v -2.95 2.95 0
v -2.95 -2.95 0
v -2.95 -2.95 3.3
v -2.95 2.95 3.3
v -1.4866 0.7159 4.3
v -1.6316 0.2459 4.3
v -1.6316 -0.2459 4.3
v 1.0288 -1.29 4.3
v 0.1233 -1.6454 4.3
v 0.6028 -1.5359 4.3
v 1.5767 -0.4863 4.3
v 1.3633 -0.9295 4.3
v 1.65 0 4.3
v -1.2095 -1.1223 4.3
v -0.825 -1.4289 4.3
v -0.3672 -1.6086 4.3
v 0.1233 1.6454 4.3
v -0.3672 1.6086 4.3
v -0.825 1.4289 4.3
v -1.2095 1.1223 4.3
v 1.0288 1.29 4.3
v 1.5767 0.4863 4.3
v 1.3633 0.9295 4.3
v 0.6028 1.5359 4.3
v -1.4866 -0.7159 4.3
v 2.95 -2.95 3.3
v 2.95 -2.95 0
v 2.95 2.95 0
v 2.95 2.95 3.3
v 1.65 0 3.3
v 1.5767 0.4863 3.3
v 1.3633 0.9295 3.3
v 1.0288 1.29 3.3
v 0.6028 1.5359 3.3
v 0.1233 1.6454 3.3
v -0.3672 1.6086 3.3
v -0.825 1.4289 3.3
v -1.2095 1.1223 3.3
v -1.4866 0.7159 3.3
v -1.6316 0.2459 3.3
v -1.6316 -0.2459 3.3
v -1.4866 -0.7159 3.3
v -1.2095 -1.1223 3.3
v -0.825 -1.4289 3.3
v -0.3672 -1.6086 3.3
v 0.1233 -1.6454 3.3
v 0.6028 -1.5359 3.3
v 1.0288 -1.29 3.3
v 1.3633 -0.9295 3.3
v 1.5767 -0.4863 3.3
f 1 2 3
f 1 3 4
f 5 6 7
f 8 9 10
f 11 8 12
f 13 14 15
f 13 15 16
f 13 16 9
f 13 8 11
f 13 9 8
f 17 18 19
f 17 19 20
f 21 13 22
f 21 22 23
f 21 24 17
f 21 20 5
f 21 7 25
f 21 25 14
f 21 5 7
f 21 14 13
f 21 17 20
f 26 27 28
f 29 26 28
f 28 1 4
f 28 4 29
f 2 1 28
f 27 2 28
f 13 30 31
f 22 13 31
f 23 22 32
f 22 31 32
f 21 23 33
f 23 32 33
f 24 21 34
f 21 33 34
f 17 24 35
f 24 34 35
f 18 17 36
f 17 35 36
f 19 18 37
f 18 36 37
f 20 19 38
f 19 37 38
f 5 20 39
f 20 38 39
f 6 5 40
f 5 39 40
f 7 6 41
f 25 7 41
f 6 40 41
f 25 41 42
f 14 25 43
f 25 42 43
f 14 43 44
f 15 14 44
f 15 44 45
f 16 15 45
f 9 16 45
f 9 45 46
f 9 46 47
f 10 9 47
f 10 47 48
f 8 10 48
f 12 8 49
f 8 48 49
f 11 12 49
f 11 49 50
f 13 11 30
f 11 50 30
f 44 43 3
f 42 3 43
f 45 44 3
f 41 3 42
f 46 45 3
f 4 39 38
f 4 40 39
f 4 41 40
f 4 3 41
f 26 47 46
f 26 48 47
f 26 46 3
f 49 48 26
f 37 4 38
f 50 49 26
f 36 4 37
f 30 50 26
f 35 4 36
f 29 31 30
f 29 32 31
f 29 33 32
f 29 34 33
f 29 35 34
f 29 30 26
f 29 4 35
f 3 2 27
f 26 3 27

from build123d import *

# Parameters (mm, degrees)
ESBO_O1_W                = 5.9
ESBO_O1_H                = 5.9
RESSALTO_EXTRUS_O1_DEPTH = 3.3
ESBO_O2_R                = 1.65
RESSALTO_EXTRUS_O2_DEPTH = 1


with BuildPart() as part:
    # Esboço1 → Ressalto-extrusão1 (new body)
    with BuildSketch(Plane.XY):
        Rectangle(ESBO_O1_W, ESBO_O1_H)
    extrude(amount=RESSALTO_EXTRUS_O1_DEPTH)

    # Esboço2 → Ressalto-extrusão2 (add)
    with BuildSketch(Plane.XY.offset(3.3)):
        Circle(ESBO_O2_R)
    extrude(amount=RESSALTO_EXTRUS_O2_DEPTH)


solid = part.part
